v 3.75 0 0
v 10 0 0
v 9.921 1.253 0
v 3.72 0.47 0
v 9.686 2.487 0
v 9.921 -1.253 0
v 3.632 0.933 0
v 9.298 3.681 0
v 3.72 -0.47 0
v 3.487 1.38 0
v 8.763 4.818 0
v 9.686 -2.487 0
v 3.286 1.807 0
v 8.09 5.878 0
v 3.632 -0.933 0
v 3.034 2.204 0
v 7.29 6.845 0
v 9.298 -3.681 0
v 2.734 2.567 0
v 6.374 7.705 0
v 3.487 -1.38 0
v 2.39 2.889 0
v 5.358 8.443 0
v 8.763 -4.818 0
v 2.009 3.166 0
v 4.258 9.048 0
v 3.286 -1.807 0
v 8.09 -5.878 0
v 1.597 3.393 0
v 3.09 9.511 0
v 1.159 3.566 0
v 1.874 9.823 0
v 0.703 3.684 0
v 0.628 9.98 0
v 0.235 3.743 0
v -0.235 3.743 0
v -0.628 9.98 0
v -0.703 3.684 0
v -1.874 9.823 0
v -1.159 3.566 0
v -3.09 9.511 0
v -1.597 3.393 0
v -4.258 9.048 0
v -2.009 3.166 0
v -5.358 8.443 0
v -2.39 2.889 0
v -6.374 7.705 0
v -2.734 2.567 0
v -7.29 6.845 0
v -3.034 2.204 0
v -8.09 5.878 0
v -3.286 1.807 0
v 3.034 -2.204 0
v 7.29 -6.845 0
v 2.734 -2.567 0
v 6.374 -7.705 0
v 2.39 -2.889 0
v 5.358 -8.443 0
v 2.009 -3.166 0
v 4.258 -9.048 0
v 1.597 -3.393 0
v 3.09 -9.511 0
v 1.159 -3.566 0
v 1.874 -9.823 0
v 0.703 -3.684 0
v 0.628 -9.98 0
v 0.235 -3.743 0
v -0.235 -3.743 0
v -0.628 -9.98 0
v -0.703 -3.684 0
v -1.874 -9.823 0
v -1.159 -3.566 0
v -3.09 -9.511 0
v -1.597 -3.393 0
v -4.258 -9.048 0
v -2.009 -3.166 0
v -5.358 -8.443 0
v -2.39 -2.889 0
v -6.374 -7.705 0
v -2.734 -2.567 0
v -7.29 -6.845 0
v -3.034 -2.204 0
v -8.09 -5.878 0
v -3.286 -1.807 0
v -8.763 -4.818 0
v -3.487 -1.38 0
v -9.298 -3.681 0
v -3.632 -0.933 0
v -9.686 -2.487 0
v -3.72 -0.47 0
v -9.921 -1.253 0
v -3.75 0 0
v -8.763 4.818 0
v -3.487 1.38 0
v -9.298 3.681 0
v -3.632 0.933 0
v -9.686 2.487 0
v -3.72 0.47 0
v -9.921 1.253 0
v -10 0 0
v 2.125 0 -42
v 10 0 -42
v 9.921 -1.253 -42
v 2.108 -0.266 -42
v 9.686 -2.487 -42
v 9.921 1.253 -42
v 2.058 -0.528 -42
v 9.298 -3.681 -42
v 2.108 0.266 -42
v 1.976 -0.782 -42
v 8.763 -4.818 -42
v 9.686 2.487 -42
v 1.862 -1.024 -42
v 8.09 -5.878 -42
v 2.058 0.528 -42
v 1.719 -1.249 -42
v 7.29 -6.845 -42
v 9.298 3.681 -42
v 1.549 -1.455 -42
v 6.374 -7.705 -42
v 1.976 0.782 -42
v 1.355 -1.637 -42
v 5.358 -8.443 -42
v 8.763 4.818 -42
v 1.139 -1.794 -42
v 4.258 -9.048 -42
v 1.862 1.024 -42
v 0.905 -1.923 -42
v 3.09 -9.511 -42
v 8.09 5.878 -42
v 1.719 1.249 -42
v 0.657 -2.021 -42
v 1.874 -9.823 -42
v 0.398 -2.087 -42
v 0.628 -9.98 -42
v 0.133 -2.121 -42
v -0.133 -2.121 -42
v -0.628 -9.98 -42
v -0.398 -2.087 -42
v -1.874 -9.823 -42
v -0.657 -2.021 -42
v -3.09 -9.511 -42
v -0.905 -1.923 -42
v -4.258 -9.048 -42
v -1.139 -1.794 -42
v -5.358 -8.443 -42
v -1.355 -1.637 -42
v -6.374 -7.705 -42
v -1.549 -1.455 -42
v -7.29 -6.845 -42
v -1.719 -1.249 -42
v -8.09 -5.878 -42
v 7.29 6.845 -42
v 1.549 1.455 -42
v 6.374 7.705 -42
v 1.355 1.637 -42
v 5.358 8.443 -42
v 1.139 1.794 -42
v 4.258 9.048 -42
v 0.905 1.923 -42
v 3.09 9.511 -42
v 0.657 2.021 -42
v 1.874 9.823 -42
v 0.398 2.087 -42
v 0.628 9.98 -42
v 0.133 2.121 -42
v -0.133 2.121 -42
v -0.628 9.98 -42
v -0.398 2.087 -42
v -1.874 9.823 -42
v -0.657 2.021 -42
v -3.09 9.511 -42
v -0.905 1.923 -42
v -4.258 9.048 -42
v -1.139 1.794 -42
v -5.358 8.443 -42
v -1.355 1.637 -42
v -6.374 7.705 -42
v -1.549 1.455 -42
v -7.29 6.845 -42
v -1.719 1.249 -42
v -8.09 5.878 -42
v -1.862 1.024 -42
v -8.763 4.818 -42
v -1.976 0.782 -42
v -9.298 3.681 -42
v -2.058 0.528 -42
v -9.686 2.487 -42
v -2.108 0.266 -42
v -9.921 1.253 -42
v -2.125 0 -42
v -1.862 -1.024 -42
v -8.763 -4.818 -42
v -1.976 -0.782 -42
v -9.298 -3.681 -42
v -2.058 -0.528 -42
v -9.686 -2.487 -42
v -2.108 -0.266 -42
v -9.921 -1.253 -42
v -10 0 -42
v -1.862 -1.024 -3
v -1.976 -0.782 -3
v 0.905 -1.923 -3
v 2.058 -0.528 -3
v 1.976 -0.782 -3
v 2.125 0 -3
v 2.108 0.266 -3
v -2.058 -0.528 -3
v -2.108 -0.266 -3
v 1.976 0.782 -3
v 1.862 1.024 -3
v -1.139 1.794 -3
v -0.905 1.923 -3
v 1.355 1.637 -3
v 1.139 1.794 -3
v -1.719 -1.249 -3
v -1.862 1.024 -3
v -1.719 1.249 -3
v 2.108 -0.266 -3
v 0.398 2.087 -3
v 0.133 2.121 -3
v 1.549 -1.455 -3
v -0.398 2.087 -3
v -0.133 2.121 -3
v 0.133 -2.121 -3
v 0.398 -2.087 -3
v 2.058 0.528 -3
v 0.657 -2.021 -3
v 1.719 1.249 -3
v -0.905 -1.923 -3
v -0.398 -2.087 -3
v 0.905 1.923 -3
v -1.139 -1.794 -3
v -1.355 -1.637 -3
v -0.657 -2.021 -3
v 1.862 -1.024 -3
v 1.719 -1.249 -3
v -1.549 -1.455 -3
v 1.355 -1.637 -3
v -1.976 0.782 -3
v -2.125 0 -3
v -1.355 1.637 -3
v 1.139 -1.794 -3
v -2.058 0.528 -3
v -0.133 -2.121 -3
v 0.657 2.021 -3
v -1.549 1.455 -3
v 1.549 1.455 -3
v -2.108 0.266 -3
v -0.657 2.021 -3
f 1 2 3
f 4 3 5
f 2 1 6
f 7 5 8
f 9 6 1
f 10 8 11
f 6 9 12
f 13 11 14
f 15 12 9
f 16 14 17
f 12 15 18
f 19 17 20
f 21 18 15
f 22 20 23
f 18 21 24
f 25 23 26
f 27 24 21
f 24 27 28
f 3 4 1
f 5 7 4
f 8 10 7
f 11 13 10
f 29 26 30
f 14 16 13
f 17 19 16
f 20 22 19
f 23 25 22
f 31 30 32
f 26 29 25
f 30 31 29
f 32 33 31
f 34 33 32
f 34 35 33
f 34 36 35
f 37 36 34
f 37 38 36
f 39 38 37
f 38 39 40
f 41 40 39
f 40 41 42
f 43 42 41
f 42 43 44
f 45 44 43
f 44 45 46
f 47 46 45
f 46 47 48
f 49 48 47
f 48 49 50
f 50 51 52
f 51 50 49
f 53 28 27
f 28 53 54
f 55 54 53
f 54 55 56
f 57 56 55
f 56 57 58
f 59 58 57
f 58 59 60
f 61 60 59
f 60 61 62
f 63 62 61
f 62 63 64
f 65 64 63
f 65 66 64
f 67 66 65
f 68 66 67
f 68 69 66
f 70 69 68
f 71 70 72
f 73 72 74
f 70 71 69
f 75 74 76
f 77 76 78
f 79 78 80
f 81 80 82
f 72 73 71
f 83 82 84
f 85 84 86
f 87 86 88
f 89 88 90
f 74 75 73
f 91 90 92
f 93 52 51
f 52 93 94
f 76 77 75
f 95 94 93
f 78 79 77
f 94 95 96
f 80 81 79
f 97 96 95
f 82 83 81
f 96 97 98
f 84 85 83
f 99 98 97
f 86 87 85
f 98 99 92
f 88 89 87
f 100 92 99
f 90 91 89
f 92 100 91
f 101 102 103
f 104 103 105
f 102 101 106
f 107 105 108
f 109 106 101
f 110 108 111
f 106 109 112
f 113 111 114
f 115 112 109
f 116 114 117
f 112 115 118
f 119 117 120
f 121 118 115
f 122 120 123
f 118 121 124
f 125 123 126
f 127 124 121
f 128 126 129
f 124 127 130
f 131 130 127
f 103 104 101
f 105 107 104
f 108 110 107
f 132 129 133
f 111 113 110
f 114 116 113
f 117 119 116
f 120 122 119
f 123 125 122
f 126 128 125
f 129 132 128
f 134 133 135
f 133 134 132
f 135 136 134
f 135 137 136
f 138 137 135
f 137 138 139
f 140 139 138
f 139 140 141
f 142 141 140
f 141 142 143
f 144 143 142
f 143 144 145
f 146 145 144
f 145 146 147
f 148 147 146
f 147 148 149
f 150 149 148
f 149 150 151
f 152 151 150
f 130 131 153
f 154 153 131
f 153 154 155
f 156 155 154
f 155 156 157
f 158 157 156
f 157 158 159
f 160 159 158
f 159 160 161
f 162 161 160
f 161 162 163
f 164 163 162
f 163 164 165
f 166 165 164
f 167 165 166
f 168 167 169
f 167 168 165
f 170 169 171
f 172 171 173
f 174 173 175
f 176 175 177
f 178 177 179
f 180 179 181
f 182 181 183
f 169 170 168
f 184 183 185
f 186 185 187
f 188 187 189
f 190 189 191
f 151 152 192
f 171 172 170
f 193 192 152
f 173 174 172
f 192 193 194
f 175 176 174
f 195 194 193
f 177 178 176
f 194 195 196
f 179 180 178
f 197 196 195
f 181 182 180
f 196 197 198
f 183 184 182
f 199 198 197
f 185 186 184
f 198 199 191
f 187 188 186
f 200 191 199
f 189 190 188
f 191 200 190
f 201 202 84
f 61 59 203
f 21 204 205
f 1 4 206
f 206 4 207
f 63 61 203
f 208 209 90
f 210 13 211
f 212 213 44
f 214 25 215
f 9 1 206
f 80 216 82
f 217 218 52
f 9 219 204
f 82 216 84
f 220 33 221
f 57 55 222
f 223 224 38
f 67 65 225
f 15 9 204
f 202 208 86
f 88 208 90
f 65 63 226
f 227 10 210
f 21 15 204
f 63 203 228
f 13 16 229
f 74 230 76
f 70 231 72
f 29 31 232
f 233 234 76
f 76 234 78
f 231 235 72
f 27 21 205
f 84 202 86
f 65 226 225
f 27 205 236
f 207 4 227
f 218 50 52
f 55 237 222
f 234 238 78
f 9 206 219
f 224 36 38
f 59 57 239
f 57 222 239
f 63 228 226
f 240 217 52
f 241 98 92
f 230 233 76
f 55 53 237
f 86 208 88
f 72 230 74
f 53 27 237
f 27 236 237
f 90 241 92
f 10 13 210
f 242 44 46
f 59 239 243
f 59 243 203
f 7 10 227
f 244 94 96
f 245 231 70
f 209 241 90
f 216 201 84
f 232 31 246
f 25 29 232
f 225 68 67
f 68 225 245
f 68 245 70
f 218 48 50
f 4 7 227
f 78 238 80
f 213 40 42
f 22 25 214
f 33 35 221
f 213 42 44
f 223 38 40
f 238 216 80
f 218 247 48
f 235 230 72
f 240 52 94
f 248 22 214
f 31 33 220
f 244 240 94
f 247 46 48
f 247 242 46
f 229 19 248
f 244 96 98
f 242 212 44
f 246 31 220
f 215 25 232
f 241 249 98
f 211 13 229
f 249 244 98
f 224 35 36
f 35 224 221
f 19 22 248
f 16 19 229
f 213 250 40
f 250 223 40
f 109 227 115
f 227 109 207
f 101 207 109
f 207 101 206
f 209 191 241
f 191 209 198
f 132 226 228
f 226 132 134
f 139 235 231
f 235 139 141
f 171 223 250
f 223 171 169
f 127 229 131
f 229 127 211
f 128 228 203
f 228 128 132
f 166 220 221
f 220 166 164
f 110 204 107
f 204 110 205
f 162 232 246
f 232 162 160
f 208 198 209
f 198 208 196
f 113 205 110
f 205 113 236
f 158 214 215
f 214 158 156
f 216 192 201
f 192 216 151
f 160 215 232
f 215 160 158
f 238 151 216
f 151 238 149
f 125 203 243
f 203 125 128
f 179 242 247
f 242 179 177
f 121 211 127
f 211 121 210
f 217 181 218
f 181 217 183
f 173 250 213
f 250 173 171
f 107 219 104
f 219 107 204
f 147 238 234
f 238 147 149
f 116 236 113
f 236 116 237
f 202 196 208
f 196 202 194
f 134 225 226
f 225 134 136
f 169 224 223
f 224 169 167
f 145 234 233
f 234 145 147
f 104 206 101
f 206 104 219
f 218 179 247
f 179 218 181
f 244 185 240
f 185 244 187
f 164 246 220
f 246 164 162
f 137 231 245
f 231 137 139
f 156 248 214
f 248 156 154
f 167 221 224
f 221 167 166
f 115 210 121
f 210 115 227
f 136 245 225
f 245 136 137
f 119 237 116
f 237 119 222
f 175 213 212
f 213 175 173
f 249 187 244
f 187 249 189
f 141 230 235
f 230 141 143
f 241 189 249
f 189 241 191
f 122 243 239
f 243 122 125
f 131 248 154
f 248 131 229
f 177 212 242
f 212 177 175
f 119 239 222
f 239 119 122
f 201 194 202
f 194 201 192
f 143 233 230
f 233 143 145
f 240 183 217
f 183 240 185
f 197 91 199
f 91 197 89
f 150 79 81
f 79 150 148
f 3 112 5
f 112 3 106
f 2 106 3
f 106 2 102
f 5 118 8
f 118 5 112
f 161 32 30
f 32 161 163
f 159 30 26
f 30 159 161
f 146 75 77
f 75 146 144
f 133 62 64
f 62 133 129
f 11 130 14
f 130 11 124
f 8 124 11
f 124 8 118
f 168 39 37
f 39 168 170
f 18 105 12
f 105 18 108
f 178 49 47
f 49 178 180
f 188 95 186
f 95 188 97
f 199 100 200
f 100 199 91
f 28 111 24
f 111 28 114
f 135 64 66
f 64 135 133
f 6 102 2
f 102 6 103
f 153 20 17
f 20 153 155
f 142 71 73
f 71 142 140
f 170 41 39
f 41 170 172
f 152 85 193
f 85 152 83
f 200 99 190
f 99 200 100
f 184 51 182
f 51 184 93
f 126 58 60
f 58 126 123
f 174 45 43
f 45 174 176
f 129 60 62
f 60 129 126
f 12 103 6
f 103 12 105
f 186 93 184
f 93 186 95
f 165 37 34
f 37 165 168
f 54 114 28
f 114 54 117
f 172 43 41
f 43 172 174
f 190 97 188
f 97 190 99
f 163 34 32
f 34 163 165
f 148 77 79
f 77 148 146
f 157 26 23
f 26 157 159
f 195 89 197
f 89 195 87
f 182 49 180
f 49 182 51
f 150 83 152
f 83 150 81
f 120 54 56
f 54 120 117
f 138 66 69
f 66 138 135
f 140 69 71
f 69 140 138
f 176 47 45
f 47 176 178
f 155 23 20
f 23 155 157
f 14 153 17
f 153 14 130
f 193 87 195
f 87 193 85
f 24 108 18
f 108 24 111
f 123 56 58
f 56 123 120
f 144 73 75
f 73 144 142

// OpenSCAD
$fn = 50;


difference() {
	union() {
		translate(v = [0, 0, -42.0000000000]) {
			cylinder(h = 42, r = 10.0000000000);
		}
	}
	union() {
		translate(v = [0, 0, 0]) {
			rotate(a = [0, 0, 0]) {
				difference() {
					union() {
						#translate(v = [0, 0, -42.0000000000]) {
							cylinder(h = 42, r = 2.0000000000);
						}
						#translate(v = [0, 0, -3]) {
							cylinder(h = 3, r = 10.0000000000, r1 = 2.1250000000, r2 = 3.7500000000);
						}
						#translate(v = [0, 0, -42.0000000000]) {
							cylinder(h = 42, r = 2.1250000000);
						}
						#translate(v = [0, 0, -42.0000000000]) {
							cylinder(h = 42, r = 2.0000000000);
						}
					}
					union();
				}
			}
		}
	}
}
